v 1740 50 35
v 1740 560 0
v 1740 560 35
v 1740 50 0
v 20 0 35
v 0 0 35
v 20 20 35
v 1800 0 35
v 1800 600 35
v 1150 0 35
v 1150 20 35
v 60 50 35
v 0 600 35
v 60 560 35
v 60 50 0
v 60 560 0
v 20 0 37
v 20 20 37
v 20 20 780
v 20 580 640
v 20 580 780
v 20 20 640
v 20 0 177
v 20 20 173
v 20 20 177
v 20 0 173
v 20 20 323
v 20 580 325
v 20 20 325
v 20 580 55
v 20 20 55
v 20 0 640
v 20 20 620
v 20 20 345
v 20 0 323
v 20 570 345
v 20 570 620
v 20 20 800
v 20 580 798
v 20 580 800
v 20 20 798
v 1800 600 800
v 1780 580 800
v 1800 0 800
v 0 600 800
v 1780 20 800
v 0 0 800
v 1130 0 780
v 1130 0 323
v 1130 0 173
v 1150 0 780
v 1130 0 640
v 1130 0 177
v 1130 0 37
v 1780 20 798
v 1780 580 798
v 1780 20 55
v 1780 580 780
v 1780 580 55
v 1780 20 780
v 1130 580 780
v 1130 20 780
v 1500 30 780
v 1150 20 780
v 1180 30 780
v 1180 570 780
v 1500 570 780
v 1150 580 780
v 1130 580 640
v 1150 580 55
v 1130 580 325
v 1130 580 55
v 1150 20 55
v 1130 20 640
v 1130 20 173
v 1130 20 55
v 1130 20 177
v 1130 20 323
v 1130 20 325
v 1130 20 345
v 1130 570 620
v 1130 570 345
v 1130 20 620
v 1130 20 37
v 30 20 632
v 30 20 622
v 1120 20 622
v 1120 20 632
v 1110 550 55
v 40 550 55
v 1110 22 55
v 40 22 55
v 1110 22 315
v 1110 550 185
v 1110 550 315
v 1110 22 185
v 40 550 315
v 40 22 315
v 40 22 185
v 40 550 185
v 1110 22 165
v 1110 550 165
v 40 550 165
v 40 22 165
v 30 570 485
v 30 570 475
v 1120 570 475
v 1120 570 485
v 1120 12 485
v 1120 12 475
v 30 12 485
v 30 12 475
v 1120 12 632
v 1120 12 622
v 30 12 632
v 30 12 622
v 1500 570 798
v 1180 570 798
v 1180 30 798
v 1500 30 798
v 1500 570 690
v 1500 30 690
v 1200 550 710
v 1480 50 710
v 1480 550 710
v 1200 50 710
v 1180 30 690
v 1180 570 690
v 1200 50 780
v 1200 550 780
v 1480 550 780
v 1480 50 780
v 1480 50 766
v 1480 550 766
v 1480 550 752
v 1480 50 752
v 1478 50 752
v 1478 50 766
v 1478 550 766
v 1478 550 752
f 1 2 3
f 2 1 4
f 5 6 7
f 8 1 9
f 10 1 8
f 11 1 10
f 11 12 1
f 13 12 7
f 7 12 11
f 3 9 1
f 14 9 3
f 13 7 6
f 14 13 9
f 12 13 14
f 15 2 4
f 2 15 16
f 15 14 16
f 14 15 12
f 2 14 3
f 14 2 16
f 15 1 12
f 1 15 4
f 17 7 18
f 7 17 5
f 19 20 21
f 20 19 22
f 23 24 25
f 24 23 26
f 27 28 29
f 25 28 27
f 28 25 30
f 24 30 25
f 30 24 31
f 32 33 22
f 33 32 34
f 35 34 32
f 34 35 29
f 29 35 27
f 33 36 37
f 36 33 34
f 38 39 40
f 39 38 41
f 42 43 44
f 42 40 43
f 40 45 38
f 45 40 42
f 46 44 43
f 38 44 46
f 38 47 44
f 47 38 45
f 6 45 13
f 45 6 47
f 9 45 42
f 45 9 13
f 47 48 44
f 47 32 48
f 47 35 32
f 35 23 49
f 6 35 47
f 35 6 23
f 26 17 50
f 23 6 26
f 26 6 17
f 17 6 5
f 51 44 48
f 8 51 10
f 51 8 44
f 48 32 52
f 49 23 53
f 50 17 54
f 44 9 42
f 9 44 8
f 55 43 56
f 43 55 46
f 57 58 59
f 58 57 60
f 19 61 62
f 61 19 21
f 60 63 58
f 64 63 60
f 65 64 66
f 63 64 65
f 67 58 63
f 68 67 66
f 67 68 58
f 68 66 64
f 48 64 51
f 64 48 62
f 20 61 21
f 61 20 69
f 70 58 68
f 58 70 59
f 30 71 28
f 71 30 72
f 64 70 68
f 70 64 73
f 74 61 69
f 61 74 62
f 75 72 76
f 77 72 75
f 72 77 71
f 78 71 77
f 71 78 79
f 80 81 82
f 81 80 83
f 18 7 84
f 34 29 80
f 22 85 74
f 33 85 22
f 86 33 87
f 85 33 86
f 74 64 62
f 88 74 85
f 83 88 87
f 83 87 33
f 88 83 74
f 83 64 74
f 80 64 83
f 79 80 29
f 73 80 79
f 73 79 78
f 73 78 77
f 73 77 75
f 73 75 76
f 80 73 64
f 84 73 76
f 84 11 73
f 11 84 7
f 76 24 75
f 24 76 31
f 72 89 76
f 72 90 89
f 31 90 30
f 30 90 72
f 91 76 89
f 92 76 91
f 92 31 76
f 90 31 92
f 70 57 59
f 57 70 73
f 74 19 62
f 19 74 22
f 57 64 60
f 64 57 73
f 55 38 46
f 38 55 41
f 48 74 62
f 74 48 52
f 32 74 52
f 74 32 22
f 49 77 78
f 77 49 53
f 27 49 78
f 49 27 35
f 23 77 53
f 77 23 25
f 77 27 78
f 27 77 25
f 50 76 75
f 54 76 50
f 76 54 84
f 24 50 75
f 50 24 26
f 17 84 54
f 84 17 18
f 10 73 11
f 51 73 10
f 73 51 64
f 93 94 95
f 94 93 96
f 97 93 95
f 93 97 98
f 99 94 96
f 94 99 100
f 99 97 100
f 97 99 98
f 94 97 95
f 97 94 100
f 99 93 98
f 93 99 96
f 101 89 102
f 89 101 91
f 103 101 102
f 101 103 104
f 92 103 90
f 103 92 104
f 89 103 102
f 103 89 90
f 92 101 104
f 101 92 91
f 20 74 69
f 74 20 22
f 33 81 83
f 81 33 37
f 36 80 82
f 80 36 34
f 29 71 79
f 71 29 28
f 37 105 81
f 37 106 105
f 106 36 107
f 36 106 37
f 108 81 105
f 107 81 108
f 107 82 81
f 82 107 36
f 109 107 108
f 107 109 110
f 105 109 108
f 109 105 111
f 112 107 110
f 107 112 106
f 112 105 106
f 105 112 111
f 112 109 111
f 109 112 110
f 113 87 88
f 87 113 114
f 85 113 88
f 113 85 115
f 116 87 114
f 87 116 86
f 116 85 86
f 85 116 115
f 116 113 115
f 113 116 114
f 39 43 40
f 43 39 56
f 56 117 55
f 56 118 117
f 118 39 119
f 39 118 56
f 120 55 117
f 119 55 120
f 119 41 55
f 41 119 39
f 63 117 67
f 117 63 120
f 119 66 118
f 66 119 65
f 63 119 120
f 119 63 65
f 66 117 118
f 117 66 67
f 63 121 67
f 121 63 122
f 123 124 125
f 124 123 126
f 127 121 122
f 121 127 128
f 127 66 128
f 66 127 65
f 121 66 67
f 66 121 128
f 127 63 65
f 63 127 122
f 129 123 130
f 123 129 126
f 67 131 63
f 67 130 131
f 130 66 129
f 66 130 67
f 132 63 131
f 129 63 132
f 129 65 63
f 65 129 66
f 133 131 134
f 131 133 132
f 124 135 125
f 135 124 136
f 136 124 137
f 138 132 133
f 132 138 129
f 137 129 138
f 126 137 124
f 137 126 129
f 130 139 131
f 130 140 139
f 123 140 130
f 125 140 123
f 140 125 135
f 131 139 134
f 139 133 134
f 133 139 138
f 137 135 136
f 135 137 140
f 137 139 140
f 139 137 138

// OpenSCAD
// Parametric 1:1 cabinet model. All dimensions are millimetres.
// X = width, Y = depth (front at 0), Z = height.
$fn = 32;
W = 1800; D = 600; H = 800;
MAIN_W = 1300; RIGHT_W = 500; PANEL = 20; PLINTH_H = 35;
CAVITY_W = 440; CAVITY_D = 540; CAVITY_INSET = 30;

module cabinet_part(pos, size, rgba) {
    color(rgba) translate(pos) cube(size, center=false);
}

union() {
    // plinth
    cabinet_part([60.000, 50.000, 0.000], [1680.000, 510.000, 35.000], [0.9850, 0.9850, 0.9850, 1.0000]);
    // left_side_panel
    cabinet_part([0.000, 0.000, 35.000], [20.000, 600.000, 765.000], [0.9850, 0.9850, 0.9850, 1.0000]);
    // right_side_panel
    cabinet_part([1780.000, 0.000, 35.000], [20.000, 600.000, 765.000], [0.9850, 0.9850, 0.9850, 1.0000]);
    // rear_panel
    cabinet_part([20.000, 580.000, 35.000], [1760.000, 20.000, 745.000], [0.9850, 0.9850, 0.9850, 1.0000]);
    // module_divider
    cabinet_part([1130.000, 20.000, 35.000], [20.000, 560.000, 745.000], [0.9850, 0.9850, 0.9850, 1.0000]);
    // main_bottom_panel
    cabinet_part([20.000, 20.000, 35.000], [1110.000, 560.000, 20.000], [0.9850, 0.9850, 0.9850, 1.0000]);
    // right_bottom_panel
    cabinet_part([1150.000, 20.000, 35.000], [630.000, 560.000, 20.000], [0.9850, 0.9850, 0.9850, 1.0000]);
    // upper_front_panel
    cabinet_part([20.000, 0.000, 640.000], [1110.000, 20.000, 160.000], [0.9850, 0.9850, 0.9850, 1.0000]);
    // upper_drawer_front
    cabinet_part([20.000, 0.000, 177.000], [1110.000, 20.000, 146.000], [0.9850, 0.9850, 0.9850, 1.0000]);
    // lower_drawer_front
    cabinet_part([20.000, 0.000, 37.000], [1110.000, 20.000, 136.000], [0.9850, 0.9850, 0.9850, 1.0000]);
    // right_full_height_door
    cabinet_part([1150.000, 0.000, 35.000], [630.000, 20.000, 765.000], [0.9850, 0.9850, 0.9850, 1.0000]);
    // upper_drawer_box
    cabinet_part([40.000, 22.000, 185.000], [1070.000, 528.000, 130.000], [0.9850, 0.9850, 0.9850, 1.0000]);
    // lower_drawer_box
    cabinet_part([40.000, 22.000, 45.000], [1070.000, 528.000, 120.000], [0.9850, 0.9850, 0.9850, 1.0000]);
    // niche_ceiling
    cabinet_part([20.000, 20.000, 620.000], [1110.000, 560.000, 20.000], [0.9850, 0.9850, 0.9850, 1.0000]);
    // niche_floor
    cabinet_part([20.000, 20.000, 325.000], [1110.000, 560.000, 20.000], [0.9850, 0.9850, 0.9850, 1.0000]);
    // niche_back_lining
    cabinet_part([20.000, 570.000, 325.000], [1110.000, 10.000, 315.000], [0.9850, 0.9850, 0.9850, 1.0000]);
    // niche_shelf
    cabinet_part([30.000, 18.000, 475.000], [1090.000, 552.000, 10.000], [0.9850, 0.9850, 0.9850, 1.0000]);
    // niche_shelf_front_edge
    cabinet_part([30.000, 12.000, 475.000], [1090.000, 10.000, 10.000], [0.9850, 0.9850, 0.9850, 1.0000]);
    // niche_upper_trim
    cabinet_part([30.000, 12.000, 622.000], [1090.000, 12.000, 10.000], [0.9850, 0.9850, 0.9850, 1.0000]);
    // niche_light_strip
    cabinet_part([40.000, 20.000, 624.000], [1070.000, 6.000, 5.000], [0.9850, 0.9850, 0.9850, 1.0000]);
    // top_front_rim
    cabinet_part([0.000, 0.000, 780.000], [1800.000, 20.000, 20.000], [0.9850, 0.9850, 0.9850, 1.0000]);
    // top_back_rim
    cabinet_part([0.000, 580.000, 780.000], [1800.000, 20.000, 20.000], [0.9850, 0.9850, 0.9850, 1.0000]);
    // top_left_rim
    cabinet_part([0.000, 20.000, 780.000], [20.000, 560.000, 20.000], [0.9850, 0.9850, 0.9850, 1.0000]);
    // top_right_rim
    cabinet_part([1780.000, 20.000, 780.000], [20.000, 560.000, 20.000], [0.9850, 0.9850, 0.9850, 1.0000]);
    // main_top_surface
    cabinet_part([20.000, 20.000, 780.000], [1130.000, 560.000, 18.000], [0.9850, 0.9850, 0.9850, 1.0000]);
    // right_top_surface
    cabinet_part([1500.000, 20.000, 780.000], [280.000, 560.000, 18.000], [0.9850, 0.9850, 0.9850, 1.0000]);
    // cavity_left_rim
    cabinet_part([1150.000, 20.000, 780.000], [30.000, 560.000, 18.000], [0.9850, 0.9850, 0.9850, 1.0000]);
    // cavity_front_rim
    cabinet_part([1180.000, 20.000, 780.000], [320.000, 10.000, 18.000], [0.9850, 0.9850, 0.9850, 1.0000]);
    // cavity_back_rim
    cabinet_part([1180.000, 570.000, 780.000], [320.000, 10.000, 18.000], [0.9850, 0.9850, 0.9850, 1.0000]);
    // cavity_floor
    cabinet_part([1180.000, 30.000, 690.000], [320.000, 540.000, 20.000], [0.9850, 0.9850, 0.9850, 1.0000]);
    // cavity_left_wall
    cabinet_part([1180.000, 30.000, 710.000], [20.000, 540.000, 70.000], [0.9850, 0.9850, 0.9850, 1.0000]);
    // cavity_right_wall
    cabinet_part([1480.000, 30.000, 710.000], [20.000, 540.000, 70.000], [0.9850, 0.9850, 0.9850, 1.0000]);
    // cavity_front_wall
    cabinet_part([1200.000, 30.000, 710.000], [280.000, 20.000, 70.000], [0.9850, 0.9850, 0.9850, 1.0000]);
    // cavity_back_wall
    cabinet_part([1200.000, 550.000, 710.000], [280.000, 20.000, 70.000], [0.9850, 0.9850, 0.9850, 1.0000]);
    // cavity_longitudinal_guide
    cabinet_part([1478.000, 50.000, 752.000], [10.000, 500.000, 14.000], [0.9850, 0.9850, 0.9850, 1.0000]);
    // cavity_inner_rail
    cabinet_part([1488.000, 50.000, 738.000], [8.000, 500.000, 14.000], [0.9850, 0.9850, 0.9850, 1.0000]);
    // cavity_light_bar
    cabinet_part([1492.000, 60.000, 754.000], [8.000, 480.000, 8.000], [0.9850, 0.9850, 0.9850, 1.0000]);
}
